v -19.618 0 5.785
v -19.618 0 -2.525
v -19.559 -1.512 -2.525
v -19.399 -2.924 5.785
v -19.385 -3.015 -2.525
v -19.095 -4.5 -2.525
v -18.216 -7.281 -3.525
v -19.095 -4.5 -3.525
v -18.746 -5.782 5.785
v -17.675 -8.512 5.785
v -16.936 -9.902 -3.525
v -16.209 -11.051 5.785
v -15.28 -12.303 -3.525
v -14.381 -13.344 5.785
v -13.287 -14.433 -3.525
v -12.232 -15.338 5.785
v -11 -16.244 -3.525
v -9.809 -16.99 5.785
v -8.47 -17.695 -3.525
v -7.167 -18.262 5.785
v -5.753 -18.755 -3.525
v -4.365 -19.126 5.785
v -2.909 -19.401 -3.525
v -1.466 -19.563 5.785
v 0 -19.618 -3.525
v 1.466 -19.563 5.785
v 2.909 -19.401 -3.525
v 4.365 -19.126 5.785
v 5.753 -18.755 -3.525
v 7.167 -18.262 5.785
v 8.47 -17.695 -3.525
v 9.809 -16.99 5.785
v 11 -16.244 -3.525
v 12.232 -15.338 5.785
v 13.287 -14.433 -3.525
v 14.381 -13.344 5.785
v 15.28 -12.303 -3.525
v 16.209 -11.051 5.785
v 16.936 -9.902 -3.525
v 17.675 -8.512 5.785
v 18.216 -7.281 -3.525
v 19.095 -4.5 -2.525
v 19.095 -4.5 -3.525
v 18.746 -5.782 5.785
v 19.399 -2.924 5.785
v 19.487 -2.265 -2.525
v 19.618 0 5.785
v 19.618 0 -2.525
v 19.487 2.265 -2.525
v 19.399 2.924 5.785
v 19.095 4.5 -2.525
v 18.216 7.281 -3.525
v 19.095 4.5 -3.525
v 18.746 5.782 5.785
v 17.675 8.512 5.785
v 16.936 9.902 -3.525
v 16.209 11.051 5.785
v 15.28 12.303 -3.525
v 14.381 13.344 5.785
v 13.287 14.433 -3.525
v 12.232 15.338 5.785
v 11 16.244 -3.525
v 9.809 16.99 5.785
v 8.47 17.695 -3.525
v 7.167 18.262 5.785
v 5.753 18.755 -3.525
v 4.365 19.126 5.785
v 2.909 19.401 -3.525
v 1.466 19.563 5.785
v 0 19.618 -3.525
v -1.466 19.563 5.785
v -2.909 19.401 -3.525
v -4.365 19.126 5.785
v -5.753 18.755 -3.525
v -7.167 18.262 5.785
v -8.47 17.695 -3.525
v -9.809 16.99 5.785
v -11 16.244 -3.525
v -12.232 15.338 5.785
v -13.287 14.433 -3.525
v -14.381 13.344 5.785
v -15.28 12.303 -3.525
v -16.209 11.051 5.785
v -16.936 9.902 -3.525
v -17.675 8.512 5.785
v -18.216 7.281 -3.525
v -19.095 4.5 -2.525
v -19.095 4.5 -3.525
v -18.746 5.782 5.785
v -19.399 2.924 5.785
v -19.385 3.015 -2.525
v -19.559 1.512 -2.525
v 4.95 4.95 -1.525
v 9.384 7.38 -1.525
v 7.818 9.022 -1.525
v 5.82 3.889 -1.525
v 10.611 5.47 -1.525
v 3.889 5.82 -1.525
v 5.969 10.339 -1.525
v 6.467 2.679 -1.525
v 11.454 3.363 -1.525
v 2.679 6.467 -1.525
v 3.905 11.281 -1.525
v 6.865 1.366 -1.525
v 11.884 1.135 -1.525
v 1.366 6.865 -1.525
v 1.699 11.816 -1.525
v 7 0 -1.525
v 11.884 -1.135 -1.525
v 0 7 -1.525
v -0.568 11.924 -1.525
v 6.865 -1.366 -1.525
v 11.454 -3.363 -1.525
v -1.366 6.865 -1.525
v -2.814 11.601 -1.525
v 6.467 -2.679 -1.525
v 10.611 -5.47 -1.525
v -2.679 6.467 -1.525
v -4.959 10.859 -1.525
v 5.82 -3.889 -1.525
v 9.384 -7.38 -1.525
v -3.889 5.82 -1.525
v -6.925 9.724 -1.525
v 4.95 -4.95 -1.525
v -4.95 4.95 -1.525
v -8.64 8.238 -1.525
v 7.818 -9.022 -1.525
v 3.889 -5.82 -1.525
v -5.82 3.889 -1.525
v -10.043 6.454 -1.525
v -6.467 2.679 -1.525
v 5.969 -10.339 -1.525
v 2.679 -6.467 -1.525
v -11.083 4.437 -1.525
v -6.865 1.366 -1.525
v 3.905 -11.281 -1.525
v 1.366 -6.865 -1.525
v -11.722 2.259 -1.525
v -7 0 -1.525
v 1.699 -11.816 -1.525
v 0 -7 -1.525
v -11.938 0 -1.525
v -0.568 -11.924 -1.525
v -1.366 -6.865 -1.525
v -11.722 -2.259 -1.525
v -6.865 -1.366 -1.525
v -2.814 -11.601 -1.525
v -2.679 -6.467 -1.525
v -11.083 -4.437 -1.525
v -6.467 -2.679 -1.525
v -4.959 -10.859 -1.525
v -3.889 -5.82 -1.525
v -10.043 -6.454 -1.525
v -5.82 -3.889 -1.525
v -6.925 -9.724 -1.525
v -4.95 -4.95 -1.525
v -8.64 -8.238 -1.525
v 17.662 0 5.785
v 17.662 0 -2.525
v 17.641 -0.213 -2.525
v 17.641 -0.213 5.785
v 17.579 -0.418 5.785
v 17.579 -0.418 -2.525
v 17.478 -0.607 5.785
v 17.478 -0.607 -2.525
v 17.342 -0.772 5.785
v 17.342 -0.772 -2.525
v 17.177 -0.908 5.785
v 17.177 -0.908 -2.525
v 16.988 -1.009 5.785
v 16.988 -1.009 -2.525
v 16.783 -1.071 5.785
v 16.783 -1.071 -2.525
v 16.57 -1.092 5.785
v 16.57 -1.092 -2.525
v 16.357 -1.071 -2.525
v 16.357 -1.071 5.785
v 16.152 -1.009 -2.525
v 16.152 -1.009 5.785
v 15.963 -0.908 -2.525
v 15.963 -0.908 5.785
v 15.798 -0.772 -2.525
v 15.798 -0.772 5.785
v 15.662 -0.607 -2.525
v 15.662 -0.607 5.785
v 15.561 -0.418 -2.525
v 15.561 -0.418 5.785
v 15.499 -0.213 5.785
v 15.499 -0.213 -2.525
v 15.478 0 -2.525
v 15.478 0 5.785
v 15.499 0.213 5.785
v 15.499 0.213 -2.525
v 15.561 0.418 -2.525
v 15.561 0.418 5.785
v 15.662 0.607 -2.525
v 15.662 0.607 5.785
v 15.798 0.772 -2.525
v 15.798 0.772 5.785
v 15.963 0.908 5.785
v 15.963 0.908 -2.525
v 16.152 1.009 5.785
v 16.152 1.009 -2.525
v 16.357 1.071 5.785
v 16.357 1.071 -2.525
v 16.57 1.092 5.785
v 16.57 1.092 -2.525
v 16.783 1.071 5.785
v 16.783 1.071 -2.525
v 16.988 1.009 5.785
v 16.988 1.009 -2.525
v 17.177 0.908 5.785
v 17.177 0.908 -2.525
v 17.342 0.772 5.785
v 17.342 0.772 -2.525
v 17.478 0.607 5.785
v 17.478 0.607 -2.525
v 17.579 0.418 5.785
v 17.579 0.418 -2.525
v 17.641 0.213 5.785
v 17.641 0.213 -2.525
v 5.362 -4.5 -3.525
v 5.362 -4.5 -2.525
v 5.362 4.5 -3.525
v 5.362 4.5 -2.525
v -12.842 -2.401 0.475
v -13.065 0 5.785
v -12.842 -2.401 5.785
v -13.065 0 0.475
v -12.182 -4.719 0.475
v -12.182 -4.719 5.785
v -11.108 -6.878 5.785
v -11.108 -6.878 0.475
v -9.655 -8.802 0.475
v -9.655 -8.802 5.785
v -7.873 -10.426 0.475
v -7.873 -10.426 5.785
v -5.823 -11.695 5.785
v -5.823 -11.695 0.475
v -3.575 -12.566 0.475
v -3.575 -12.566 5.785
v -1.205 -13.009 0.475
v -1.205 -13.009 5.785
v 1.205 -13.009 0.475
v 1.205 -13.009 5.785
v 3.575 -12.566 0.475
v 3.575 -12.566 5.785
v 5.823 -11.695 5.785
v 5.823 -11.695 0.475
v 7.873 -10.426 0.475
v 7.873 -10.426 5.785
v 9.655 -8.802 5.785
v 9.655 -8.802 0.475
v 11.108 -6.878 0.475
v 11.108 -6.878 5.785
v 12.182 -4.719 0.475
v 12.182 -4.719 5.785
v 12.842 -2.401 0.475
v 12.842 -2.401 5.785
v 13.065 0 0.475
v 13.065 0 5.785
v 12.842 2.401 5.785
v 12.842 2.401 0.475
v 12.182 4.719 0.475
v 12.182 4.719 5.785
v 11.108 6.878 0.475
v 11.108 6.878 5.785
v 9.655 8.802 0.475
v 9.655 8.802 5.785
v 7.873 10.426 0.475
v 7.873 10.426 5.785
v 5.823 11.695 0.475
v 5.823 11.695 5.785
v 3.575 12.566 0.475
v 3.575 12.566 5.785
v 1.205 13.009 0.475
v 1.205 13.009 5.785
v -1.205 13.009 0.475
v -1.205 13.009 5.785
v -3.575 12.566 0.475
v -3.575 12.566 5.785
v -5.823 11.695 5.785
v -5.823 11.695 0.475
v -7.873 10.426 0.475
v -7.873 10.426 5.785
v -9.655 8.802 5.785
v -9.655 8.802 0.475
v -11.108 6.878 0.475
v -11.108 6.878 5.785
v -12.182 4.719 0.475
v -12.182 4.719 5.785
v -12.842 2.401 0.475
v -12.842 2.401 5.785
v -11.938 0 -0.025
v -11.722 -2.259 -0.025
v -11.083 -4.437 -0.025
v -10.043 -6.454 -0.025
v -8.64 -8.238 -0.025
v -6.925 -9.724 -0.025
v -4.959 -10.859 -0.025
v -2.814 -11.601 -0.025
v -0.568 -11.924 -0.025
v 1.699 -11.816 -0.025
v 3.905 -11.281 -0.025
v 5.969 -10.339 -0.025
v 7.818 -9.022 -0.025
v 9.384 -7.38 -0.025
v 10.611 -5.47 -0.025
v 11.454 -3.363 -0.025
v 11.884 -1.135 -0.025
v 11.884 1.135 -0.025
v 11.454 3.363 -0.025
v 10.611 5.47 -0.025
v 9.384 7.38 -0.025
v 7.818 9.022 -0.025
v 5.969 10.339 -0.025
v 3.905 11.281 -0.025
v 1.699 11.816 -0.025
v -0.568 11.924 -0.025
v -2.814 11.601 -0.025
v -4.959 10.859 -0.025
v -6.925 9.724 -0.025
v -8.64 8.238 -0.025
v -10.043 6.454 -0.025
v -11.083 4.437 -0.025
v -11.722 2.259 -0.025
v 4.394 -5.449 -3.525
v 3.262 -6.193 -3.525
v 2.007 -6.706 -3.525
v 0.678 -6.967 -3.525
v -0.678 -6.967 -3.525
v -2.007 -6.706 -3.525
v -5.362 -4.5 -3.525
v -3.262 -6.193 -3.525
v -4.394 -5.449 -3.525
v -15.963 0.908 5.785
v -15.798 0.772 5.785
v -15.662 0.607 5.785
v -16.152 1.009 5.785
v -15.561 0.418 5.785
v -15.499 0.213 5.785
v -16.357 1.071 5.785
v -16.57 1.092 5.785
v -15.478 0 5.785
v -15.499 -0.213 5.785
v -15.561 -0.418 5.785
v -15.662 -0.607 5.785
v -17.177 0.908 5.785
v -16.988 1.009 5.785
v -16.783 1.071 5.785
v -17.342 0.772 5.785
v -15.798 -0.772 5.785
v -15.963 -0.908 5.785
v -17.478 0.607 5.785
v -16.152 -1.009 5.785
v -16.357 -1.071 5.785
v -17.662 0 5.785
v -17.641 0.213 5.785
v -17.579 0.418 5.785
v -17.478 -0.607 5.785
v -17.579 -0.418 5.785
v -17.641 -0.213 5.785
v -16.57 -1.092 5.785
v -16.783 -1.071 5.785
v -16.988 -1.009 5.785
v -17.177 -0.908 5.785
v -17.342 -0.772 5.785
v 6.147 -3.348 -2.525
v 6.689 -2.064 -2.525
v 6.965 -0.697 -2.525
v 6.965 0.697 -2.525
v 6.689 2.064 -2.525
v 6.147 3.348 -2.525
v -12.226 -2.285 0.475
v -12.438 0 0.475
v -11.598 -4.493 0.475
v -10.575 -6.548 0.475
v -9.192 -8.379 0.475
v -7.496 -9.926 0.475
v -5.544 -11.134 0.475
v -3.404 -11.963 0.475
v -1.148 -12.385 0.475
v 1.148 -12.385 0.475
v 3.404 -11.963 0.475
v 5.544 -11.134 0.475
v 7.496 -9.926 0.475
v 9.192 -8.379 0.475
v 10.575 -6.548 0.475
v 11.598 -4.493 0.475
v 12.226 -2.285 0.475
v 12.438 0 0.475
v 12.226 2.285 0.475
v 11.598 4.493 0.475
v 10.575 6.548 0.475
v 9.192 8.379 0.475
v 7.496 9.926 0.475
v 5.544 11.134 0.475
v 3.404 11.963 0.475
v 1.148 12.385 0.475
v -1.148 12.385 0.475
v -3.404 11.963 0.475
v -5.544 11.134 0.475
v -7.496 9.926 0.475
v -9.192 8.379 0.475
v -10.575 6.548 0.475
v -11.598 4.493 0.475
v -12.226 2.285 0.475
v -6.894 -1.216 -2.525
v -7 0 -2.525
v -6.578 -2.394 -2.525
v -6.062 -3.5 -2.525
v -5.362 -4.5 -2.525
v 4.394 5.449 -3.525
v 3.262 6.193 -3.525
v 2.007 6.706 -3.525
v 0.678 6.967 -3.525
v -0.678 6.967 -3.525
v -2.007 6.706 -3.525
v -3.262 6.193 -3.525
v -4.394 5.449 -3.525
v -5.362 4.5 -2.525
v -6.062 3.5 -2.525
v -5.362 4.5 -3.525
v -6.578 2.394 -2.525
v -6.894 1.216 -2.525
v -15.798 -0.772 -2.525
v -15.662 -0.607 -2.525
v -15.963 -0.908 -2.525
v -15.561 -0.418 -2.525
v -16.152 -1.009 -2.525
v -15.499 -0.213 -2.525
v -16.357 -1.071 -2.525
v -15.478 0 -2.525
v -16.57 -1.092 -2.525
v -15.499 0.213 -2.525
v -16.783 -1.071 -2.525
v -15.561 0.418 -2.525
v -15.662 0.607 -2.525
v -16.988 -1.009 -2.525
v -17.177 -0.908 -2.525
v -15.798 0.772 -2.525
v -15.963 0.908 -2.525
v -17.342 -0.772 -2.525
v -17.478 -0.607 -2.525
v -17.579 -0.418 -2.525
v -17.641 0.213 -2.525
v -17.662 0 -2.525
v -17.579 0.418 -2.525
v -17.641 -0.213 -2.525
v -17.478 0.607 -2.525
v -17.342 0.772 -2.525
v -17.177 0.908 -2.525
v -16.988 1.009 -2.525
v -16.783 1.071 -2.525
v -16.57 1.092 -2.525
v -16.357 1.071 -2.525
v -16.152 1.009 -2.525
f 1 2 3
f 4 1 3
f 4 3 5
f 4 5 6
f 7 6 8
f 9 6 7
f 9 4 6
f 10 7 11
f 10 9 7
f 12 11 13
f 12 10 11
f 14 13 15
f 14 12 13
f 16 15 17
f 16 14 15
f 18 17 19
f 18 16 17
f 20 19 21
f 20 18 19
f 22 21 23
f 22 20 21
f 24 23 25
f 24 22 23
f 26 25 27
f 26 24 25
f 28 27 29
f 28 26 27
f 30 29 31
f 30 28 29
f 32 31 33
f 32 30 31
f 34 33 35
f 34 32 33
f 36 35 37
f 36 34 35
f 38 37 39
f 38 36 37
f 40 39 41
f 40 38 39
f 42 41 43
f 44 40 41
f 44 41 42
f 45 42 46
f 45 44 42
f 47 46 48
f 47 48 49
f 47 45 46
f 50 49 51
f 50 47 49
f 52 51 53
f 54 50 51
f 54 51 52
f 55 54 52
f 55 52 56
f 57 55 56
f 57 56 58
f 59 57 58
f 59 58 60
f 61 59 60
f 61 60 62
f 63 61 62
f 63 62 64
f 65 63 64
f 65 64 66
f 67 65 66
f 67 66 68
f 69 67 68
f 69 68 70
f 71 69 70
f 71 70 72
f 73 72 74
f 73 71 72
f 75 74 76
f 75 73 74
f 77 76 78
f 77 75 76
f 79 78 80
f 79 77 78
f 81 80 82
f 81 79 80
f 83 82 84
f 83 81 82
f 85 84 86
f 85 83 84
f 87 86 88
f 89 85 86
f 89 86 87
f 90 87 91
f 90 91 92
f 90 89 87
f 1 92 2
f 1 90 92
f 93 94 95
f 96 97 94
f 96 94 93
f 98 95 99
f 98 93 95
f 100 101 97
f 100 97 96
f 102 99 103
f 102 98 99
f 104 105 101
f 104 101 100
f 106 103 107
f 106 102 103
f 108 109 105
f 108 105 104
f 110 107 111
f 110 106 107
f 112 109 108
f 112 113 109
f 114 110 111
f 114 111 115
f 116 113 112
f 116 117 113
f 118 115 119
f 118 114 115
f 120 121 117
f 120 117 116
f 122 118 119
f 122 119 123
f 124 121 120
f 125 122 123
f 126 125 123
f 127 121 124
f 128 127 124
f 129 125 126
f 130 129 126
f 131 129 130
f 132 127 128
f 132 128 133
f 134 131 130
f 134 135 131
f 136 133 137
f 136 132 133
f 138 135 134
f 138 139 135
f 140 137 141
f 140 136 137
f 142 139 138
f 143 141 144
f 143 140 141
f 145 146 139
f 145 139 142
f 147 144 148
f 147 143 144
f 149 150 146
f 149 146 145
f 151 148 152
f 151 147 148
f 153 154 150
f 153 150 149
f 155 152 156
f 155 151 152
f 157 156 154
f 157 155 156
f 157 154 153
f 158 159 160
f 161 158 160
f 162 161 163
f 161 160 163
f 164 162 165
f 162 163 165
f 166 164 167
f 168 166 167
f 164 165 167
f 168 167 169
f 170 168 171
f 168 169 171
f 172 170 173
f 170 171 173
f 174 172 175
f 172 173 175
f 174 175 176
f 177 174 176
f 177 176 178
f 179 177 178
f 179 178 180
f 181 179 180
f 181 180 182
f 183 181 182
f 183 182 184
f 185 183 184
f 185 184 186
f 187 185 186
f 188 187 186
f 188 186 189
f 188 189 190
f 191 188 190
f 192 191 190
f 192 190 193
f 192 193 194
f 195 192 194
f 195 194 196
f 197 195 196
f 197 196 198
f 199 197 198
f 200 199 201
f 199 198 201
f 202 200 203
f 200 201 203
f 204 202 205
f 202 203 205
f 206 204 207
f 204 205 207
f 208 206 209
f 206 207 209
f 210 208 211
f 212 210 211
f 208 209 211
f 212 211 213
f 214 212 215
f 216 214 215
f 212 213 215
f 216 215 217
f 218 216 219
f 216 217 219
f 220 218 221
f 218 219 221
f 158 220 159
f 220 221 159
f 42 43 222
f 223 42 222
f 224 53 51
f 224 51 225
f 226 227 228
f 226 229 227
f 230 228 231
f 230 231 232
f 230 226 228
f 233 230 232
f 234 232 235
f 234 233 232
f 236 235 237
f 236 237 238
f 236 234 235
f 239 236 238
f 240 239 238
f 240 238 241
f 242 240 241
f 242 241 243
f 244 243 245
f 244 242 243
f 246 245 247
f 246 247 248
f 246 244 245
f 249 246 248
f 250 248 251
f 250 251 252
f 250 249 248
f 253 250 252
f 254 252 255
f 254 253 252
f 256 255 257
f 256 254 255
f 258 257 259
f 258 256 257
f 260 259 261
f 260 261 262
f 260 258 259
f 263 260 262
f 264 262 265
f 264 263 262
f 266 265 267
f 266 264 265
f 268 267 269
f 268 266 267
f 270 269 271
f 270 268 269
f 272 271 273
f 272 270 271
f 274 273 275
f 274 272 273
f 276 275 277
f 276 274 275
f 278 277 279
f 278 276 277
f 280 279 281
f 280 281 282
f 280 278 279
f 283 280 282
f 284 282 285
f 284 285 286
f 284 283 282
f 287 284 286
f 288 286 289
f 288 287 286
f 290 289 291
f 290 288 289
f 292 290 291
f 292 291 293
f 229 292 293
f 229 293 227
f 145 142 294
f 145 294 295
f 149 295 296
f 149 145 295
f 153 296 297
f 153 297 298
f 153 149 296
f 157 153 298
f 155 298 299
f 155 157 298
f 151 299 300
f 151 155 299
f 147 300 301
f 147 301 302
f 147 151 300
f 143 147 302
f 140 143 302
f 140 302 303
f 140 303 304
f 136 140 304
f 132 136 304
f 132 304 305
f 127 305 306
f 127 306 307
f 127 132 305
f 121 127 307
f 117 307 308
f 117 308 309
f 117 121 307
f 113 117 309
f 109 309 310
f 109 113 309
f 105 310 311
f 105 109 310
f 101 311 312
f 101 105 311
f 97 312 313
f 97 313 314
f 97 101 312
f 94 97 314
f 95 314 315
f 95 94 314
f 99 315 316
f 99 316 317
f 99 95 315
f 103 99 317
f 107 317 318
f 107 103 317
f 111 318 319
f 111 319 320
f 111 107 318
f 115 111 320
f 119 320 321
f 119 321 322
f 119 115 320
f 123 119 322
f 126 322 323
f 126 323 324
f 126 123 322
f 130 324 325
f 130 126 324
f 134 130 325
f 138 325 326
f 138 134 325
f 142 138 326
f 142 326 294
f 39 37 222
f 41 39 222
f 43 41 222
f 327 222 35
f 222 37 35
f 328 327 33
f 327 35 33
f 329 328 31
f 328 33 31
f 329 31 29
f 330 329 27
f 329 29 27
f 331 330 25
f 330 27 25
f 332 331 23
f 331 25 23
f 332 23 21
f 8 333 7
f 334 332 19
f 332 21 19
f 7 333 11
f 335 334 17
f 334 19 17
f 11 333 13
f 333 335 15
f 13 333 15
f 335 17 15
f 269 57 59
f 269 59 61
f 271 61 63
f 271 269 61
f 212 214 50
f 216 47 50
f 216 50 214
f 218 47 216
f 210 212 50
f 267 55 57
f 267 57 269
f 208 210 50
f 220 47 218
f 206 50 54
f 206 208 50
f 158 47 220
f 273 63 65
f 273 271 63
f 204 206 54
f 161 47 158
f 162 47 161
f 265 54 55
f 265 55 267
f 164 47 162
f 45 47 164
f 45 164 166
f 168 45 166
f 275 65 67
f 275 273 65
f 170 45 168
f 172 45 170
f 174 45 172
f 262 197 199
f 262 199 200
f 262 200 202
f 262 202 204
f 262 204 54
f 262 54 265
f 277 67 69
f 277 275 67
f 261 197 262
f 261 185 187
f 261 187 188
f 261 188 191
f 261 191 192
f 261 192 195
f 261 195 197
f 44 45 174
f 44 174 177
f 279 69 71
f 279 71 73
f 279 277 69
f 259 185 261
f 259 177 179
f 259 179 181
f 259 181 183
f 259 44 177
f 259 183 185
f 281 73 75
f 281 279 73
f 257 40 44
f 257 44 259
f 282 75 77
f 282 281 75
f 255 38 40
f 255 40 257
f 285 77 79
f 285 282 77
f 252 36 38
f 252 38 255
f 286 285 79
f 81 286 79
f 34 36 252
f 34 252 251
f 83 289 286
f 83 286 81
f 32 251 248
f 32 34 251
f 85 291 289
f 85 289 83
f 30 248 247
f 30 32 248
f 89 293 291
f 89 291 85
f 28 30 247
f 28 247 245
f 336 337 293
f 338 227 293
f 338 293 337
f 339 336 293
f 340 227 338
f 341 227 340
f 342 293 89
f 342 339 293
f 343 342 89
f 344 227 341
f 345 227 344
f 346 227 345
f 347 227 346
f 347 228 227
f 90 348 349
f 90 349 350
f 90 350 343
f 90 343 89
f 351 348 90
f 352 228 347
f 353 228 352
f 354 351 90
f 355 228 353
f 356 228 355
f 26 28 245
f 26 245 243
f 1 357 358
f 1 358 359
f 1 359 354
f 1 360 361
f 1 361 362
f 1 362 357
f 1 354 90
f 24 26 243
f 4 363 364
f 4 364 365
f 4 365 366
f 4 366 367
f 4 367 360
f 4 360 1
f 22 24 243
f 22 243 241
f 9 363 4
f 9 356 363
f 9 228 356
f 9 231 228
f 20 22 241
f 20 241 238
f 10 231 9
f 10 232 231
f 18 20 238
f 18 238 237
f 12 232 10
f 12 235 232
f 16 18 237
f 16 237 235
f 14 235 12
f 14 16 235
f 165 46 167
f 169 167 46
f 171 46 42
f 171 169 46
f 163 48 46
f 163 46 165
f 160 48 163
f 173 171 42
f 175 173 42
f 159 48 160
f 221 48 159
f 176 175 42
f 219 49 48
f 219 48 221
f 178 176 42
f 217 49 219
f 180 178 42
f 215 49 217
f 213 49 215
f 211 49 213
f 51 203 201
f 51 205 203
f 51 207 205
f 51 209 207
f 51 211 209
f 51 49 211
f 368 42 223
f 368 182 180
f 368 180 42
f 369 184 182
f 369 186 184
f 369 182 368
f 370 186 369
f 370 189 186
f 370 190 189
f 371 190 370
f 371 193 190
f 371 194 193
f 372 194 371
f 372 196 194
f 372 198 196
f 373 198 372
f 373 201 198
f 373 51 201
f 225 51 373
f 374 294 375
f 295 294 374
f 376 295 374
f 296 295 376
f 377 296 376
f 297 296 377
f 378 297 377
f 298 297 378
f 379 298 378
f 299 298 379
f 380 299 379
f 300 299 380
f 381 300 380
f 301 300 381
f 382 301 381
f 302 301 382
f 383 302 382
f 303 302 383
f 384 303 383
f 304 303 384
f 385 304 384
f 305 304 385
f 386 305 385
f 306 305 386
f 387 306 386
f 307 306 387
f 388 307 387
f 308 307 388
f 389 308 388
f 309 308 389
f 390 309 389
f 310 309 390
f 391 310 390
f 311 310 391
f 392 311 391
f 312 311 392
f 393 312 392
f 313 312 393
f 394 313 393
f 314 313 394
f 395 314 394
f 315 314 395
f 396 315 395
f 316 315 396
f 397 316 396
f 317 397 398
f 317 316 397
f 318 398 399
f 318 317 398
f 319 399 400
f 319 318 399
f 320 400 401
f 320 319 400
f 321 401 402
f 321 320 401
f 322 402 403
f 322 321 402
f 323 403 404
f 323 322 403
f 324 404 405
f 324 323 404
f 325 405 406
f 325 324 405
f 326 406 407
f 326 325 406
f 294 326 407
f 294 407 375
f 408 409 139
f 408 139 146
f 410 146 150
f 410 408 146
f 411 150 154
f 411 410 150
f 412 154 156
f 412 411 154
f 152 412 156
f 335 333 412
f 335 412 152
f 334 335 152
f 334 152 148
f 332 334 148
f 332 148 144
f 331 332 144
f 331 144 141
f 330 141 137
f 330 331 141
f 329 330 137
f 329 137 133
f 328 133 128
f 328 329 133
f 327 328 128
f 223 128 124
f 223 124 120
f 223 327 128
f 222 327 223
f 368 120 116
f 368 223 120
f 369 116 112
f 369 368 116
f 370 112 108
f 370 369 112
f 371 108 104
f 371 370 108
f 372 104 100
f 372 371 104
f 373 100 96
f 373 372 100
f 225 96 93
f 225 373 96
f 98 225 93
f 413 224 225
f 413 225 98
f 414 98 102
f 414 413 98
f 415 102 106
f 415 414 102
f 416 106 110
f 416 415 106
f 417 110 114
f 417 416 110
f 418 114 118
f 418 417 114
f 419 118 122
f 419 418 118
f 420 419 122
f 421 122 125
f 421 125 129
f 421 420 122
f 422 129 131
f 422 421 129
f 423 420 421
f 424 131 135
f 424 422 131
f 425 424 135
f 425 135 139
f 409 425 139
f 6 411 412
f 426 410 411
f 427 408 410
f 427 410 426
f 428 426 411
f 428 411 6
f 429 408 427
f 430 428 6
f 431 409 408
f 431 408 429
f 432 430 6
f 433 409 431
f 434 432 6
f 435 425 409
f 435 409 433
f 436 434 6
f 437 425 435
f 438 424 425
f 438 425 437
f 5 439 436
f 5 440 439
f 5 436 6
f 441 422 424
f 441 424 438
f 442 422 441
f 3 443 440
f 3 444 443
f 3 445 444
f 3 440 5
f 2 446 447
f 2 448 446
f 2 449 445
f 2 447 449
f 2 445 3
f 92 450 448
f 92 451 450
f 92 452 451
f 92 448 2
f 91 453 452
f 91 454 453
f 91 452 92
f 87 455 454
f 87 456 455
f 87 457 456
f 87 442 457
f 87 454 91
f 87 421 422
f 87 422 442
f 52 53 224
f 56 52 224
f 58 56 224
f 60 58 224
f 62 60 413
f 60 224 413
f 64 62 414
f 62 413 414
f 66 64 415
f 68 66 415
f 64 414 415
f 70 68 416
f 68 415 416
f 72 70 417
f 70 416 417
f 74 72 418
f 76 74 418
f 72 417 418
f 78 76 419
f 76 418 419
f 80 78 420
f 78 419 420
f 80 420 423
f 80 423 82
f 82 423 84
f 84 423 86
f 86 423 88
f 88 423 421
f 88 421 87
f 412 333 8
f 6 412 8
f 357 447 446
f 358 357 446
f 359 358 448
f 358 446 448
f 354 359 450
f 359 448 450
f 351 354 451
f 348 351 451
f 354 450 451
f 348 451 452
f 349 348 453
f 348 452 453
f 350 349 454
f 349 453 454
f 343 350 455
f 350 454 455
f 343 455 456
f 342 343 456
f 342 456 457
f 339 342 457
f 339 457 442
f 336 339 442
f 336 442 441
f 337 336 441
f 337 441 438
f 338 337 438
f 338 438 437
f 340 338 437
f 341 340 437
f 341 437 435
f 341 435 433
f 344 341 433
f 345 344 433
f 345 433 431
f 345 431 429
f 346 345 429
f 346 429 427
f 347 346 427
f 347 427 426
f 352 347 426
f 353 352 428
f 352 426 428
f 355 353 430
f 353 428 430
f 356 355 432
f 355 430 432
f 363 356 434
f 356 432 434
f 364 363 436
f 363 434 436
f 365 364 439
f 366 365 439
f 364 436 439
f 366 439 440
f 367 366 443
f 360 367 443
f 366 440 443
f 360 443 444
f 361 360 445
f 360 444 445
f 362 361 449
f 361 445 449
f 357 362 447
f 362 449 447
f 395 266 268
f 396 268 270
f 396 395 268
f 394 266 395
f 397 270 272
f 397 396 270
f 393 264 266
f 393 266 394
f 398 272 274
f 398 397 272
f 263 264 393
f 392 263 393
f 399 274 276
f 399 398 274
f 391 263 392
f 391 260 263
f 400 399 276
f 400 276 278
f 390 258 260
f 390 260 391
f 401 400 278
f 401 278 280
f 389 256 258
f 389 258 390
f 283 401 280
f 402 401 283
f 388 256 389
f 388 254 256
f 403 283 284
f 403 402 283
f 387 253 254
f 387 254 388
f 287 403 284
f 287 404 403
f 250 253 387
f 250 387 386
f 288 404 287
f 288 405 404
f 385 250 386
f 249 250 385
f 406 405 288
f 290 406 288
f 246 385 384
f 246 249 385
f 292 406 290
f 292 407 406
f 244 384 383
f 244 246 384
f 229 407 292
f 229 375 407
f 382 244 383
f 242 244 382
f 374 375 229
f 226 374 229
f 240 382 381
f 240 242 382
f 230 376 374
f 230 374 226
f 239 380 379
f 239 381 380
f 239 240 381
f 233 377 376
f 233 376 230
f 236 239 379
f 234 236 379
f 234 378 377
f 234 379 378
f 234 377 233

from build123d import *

# Parameters (mm, degrees)
SKETCH1_W          = 12.617819502
SKETCH1_H          = 2
SKETCH1_W_2        = 6.5532
SKETCH1_H_2        = 5.31
SKETCH2_R          = 1.0922
CUT_EXTRUDE1_DEPTH = 30.264206533
SKETCH3_W          = 45.123892984
SKETCH3_H          = 9
CUT_EXTRUDE2_DEPTH = 1
CHAMFER1_SIZE      = 0.5


with BuildPart() as part:
    # Sketch1 → Revolve1 (revolve)
    with BuildSketch(Plane(origin=(0, 0, 0), x_dir=(1, 0, 0), z_dir=(0, 1, 0))):
        with Locations((-13.308909751, 2.525473465)):
            Rectangle(SKETCH1_W, SKETCH1_H)
        Polygon((-11.938, 1.525473465), (-19.617819502, 1.525473465), (-19.617819502, -0.474526535), (-13.064619502, -0.474526535), (-11.938, -0.474526535), align=None)
        with Locations((-16.341219502, -3.129526535)):
            Rectangle(SKETCH1_W_2, SKETCH1_H_2)
    revolve(axis=Axis((0, 0, -25.411285606), (0, 0, 1)))

    # Sketch2 → Cut-Extrude1 (cut, through all)
    with BuildSketch(Plane(origin=(0, 0, -3.525473465), x_dir=(-1, 0, 0), z_dir=(0, 0, -1))):
        with Locations((16.57, 0)):
            Circle(SKETCH2_R)
        with Locations(Location((-16.57, 0, 0), (0, 0, 180))):
            Circle(SKETCH2_R)
    extrude(amount=-CUT_EXTRUDE1_DEPTH, mode=Mode.SUBTRACT)

    # Sketch3 → Cut-Extrude2 (cut)
    with BuildSketch(Plane(origin=(0, 0, -3.525473465), x_dir=(-1, 0, 0), z_dir=(0, 0, -1))):
        Rectangle(SKETCH3_W, SKETCH3_H)
    extrude(amount=-CUT_EXTRUDE2_DEPTH, mode=Mode.SUBTRACT)

    # Chamfer1
    chamfer1_edges = [part.edges().sort_by_distance(p)[0] for p in [
        (11.938, 0, 0.474526535),
    ]]
    chamfer(chamfer1_edges, length=CHAMFER1_SIZE)


solid = part.part
